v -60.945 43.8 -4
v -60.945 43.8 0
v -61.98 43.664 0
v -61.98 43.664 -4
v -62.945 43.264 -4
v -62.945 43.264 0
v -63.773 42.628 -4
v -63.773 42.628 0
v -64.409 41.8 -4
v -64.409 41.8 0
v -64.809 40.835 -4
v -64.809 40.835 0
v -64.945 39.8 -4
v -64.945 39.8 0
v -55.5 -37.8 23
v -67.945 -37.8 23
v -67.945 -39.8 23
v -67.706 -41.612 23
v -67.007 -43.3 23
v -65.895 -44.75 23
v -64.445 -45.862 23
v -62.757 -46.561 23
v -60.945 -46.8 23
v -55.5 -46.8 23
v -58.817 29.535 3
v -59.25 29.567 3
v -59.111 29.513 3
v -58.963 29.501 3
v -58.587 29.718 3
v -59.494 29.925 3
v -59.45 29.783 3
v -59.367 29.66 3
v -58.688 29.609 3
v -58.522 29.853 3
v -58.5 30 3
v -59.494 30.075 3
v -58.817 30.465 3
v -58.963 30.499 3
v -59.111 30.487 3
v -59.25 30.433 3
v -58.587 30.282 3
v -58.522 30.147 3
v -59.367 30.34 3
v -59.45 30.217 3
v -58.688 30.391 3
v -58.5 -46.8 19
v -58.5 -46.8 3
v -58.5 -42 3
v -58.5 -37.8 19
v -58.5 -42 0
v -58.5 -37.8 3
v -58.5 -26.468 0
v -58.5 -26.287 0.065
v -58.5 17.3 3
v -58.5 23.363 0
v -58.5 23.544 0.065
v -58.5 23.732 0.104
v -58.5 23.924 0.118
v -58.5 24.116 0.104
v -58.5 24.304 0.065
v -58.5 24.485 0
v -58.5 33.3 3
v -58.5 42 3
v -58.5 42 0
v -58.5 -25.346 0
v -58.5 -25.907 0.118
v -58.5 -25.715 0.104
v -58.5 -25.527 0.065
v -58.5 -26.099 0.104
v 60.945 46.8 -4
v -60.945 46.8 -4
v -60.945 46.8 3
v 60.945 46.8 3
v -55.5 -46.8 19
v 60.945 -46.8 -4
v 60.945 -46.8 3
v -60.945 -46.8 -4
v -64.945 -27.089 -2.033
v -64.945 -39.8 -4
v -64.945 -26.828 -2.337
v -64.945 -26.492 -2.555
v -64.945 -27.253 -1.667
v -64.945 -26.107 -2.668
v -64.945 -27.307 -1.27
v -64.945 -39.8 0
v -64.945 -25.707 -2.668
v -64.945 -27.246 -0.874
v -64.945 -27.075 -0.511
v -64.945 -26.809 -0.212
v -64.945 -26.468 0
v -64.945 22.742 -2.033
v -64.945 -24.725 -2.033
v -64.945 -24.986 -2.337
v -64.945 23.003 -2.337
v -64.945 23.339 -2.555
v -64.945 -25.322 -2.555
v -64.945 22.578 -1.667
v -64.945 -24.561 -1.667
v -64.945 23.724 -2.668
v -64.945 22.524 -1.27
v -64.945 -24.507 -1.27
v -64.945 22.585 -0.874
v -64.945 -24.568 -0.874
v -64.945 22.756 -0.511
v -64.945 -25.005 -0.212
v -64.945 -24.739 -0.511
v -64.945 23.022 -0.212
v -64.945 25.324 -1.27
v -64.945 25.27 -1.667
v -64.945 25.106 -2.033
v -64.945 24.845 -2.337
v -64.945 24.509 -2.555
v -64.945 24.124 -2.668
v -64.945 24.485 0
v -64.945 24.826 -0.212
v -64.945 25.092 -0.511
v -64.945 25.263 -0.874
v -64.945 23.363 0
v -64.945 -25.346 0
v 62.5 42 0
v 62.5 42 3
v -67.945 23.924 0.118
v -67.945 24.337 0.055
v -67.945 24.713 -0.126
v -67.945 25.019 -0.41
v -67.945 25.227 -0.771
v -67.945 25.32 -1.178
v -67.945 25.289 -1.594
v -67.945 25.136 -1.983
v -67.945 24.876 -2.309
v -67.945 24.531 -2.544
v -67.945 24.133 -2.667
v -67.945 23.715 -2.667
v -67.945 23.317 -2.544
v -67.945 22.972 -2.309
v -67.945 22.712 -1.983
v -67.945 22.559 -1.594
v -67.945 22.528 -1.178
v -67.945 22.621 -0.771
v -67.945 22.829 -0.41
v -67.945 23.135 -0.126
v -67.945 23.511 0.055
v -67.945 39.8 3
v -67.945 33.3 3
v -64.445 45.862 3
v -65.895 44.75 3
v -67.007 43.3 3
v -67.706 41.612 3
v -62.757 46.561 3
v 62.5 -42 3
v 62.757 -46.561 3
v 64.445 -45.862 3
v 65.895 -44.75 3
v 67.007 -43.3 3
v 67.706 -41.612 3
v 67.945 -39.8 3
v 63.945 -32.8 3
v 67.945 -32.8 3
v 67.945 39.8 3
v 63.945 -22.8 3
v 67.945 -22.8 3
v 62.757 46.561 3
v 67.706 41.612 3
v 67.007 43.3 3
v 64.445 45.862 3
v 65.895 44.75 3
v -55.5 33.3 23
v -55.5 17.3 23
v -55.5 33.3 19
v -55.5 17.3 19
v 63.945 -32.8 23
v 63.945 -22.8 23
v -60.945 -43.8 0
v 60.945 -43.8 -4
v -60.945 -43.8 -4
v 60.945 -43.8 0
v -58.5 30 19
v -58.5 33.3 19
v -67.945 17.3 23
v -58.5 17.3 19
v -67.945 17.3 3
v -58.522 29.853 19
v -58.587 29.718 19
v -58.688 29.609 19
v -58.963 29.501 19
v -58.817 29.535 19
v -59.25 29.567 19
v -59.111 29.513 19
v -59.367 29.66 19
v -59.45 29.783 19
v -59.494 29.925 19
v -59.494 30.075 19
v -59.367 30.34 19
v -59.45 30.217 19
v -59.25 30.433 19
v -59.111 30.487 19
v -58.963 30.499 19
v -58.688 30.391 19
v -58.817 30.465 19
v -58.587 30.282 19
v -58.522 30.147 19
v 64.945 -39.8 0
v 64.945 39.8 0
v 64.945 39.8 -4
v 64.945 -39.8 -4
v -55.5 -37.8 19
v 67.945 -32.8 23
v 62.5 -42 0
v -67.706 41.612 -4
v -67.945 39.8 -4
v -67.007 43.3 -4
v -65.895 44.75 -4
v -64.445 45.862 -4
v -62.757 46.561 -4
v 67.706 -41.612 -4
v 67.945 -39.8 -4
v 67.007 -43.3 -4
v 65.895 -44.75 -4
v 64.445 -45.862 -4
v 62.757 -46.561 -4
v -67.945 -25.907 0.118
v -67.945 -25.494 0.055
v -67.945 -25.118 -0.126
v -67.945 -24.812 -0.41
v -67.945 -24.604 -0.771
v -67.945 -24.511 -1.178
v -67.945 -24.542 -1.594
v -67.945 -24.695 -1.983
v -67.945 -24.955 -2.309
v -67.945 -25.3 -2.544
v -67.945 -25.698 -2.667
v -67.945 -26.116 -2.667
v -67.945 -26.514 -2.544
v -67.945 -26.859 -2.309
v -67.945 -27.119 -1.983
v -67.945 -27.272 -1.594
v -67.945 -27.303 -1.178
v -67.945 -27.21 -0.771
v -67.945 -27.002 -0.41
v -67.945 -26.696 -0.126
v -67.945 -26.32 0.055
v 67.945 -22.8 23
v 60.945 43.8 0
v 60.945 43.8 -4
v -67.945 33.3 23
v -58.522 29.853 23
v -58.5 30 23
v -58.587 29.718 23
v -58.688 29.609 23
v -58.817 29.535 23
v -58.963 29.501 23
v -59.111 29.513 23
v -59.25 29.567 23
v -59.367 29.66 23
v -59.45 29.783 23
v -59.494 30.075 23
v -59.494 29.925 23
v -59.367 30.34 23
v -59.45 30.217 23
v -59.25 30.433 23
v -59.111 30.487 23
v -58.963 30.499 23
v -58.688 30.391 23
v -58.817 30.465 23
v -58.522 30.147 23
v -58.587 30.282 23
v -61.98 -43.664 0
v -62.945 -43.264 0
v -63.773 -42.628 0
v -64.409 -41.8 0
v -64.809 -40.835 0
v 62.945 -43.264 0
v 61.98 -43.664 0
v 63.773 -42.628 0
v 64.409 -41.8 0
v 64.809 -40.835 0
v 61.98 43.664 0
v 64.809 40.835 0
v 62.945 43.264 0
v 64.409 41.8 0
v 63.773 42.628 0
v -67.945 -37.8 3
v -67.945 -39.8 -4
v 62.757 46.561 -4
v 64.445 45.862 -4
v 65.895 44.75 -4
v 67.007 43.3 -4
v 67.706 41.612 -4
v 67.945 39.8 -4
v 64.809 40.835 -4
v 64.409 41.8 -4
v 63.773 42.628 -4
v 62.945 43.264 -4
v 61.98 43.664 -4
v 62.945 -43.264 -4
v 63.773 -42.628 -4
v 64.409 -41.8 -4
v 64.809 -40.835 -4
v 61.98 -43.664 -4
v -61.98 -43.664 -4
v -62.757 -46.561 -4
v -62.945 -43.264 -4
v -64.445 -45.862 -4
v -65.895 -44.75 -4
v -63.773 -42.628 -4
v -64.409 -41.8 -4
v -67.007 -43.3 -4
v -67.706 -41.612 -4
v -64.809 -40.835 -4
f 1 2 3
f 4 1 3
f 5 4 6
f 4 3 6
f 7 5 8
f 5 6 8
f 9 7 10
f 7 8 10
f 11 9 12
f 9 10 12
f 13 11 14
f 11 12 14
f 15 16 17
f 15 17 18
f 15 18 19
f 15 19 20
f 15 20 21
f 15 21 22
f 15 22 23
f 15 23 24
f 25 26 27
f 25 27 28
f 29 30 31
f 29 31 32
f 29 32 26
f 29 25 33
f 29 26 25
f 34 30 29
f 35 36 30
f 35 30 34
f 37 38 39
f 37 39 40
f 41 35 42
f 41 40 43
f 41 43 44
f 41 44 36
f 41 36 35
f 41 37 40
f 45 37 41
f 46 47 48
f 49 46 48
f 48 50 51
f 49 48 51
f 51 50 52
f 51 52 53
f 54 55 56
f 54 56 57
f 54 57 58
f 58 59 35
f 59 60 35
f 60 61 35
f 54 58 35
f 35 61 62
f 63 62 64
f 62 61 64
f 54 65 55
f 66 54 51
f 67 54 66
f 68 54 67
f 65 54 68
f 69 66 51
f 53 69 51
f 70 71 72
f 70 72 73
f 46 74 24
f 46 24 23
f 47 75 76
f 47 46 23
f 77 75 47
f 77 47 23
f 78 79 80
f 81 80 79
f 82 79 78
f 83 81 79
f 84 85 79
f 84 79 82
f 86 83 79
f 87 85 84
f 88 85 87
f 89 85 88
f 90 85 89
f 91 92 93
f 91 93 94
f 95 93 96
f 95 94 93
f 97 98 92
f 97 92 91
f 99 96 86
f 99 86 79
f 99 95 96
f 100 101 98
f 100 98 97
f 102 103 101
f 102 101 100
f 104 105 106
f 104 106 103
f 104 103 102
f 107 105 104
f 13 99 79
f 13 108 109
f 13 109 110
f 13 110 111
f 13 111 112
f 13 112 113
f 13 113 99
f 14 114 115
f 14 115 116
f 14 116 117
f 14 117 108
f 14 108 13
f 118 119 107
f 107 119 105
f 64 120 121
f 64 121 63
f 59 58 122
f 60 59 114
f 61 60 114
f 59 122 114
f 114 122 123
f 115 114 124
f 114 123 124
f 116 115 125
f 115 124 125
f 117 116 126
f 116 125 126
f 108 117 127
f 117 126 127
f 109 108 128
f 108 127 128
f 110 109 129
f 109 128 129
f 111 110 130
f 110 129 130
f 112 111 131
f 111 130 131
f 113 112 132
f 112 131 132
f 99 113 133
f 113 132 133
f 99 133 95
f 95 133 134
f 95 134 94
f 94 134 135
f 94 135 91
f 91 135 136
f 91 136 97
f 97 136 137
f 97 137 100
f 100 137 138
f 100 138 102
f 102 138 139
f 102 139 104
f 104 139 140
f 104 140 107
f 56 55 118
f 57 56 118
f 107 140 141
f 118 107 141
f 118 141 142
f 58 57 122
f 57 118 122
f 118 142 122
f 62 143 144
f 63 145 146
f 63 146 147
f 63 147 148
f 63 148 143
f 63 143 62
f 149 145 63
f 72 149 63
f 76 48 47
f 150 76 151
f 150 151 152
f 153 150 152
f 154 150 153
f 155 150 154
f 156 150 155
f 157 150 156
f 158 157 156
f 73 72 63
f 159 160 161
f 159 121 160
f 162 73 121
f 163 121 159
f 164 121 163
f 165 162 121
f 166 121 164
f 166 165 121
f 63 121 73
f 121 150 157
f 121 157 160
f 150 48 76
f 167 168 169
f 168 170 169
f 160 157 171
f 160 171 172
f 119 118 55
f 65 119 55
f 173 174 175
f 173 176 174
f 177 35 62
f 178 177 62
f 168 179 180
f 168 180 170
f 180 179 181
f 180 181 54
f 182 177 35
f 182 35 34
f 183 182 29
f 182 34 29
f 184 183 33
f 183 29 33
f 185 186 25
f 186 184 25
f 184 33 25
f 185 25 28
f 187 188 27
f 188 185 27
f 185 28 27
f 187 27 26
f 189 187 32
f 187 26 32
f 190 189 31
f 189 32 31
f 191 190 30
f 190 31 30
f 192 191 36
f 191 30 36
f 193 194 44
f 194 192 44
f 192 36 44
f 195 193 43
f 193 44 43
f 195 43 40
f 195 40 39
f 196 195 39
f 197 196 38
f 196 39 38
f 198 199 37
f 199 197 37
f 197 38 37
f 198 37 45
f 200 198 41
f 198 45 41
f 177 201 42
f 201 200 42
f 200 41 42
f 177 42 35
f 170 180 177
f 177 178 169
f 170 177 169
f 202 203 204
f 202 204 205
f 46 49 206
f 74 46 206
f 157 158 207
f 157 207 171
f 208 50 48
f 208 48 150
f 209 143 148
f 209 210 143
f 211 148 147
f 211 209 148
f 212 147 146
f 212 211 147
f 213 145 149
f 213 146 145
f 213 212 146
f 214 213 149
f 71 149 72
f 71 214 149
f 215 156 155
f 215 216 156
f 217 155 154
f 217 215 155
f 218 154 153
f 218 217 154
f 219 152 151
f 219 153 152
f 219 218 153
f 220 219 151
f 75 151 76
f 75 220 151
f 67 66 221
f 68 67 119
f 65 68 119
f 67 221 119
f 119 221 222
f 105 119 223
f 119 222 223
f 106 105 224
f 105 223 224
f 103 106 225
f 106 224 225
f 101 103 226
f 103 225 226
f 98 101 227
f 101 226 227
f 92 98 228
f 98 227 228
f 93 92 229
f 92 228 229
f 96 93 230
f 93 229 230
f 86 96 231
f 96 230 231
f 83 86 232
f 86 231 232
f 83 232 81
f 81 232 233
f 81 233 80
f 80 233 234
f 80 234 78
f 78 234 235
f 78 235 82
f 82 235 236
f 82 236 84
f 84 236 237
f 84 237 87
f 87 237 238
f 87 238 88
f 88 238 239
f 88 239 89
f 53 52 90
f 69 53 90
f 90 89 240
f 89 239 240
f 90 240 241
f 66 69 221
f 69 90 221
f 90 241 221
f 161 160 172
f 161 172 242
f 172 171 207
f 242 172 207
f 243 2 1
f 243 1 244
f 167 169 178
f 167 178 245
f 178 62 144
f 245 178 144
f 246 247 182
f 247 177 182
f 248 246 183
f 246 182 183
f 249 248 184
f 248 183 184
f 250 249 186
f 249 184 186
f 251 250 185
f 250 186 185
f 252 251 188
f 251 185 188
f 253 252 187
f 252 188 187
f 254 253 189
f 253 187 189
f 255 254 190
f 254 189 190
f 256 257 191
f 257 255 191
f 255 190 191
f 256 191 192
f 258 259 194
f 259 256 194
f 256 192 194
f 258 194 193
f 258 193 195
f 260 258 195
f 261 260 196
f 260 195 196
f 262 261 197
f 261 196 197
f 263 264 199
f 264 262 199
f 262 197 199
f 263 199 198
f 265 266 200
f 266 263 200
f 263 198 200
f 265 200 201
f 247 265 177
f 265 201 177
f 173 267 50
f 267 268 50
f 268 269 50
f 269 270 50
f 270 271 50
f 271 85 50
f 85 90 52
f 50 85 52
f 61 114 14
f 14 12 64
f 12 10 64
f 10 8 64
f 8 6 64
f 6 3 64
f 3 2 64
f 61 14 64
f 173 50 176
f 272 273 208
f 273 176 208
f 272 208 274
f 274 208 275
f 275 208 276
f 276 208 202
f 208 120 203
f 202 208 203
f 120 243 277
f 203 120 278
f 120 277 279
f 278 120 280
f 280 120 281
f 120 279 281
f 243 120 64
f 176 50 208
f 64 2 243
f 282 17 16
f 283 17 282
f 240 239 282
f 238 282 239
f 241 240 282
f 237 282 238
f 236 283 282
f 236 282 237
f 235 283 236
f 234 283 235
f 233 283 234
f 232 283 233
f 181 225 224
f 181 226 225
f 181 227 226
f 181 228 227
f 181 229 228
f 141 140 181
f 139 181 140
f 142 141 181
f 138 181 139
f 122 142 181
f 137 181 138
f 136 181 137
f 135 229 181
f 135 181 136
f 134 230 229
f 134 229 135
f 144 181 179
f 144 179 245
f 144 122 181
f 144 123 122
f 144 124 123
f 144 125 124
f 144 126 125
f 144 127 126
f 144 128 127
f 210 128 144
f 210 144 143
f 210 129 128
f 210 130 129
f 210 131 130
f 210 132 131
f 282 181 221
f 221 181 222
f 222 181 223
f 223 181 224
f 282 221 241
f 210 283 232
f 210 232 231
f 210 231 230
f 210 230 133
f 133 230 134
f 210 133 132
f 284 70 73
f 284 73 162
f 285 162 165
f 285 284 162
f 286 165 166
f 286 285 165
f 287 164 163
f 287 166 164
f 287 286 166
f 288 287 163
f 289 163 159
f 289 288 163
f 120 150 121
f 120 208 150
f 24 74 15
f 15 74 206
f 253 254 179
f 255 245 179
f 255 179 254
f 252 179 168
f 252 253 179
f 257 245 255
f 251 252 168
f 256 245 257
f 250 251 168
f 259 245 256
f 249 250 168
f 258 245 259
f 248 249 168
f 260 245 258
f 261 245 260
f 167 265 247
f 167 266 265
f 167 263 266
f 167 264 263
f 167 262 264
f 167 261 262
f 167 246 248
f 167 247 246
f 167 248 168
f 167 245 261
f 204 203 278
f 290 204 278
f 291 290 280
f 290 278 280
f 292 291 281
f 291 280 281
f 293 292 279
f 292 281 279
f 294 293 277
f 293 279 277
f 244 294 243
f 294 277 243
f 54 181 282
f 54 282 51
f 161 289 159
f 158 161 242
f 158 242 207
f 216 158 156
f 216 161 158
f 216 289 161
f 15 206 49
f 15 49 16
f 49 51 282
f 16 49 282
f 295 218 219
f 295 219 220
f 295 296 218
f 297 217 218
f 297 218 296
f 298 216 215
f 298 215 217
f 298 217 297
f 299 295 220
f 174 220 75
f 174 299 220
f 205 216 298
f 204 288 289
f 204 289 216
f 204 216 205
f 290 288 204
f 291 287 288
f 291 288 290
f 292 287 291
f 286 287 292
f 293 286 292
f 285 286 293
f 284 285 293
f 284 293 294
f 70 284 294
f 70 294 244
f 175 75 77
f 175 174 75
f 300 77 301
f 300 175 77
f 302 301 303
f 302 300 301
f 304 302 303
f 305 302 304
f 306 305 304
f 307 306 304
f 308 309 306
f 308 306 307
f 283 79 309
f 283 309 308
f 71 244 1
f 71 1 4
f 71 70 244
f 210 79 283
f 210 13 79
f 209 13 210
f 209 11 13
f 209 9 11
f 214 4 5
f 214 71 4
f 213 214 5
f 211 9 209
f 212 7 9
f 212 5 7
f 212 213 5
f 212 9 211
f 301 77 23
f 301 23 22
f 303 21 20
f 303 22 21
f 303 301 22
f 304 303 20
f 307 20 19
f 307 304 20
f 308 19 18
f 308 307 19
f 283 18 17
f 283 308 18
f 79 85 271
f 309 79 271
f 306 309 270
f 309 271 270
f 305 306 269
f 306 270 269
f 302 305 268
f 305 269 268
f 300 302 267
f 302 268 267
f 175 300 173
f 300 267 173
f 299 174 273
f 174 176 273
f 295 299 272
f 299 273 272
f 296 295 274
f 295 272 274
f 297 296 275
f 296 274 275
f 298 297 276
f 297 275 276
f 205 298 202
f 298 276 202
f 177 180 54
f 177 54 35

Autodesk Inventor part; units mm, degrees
ref_plane "YZ Plane" through (0, 0, 0) normal (1, 0, 0) x (0, 1, 0)
ref_plane "XZ Plane" through (0, 0, 0) normal (0, 1, 0) x (-1, 0, 0)
ref_plane "XY Plane" through (0, 0, 0) normal (0, 0, 1) x (1, 0, 0)
ref_plane "Work Plane1" through (-7.109, -3.9363, 0) normal (0, 0, 1) x (1, 0, 0)
sketch "Sketch1" plane through (-7.109, -3.9363, 0) normal (0, 0, 1) x (1, 0, 0)
  line L0 (71.054, 43.7363) -> (71.054, -35.8637) construction
  arc A0 (71.054, 43.7363) -> (68.054, 46.7363) centre (68.054, 43.7363) ccw construction
  line L1 (-53.836, 46.7363) -> (68.054, 46.7363) construction
  arc A1 (-53.836, 46.7363) -> (-56.836, 43.7363) centre (-53.836, 43.7363) ccw construction
  line L2 (-56.836, -35.8637) -> (-56.836, 43.7363) construction
  arc A2 (-56.836, -35.8637) -> (-53.836, -38.8637) centre (-53.836, -35.8637) ccw construction
  line L3 (68.054, -38.8637) -> (-53.836, -38.8637) construction
  arc A3 (68.054, -38.8637) -> (71.054, -35.8637) centre (68.054, -35.8637) ccw construction
  line L4 (-56.516, -35.5437) -> (-56.516, 43.4163) construction
  arc A4 (-53.516, 46.4163) -> (-56.516, 43.4163) centre (-53.516, 43.4163) ccw construction
  line L5 (-53.516, 46.4163) -> (67.734, 46.4163) construction
  arc A5 (70.734, 43.4163) -> (67.734, 46.4163) centre (67.734, 43.4163) ccw construction
  line L6 (70.734, 43.4163) -> (70.734, -35.5437) construction
  arc A6 (67.734, -38.5437) -> (70.734, -35.5437) centre (67.734, -35.5437) ccw construction
  line L7 (67.734, -38.5437) -> (-53.516, -38.5437) construction
  arc A7 (-56.516, -35.5437) -> (-53.516, -38.5437) centre (-53.516, -35.5437) ccw construction
  arc A8 (75.054, 43.7363) -> (68.054, 50.7363) centre (68.054, 43.7363) ccw
  line L8 (75.054, 43.7363) -> (75.054, -35.8637)
  arc A9 (68.054, -42.8637) -> (75.054, -35.8637) centre (68.054, -35.8637) ccw
  line L9 (68.054, -42.8637) -> (-53.836, -42.8637)
  arc A10 (-60.836, -35.8637) -> (-53.836, -42.8637) centre (-53.836, -35.8637) ccw
  line L10 (-60.836, -35.8637) -> (-60.836, 43.7363)
  arc A11 (-53.836, 50.7363) -> (-60.836, 43.7363) centre (-53.836, 43.7363) ccw
  line L11 (-53.836, 50.7363) -> (68.054, 50.7363)
  circle A12 centre (53.6173, 21.8363) radius 4 construction
  circle A13 centre (53.6173, 3.8363) radius 4 construction
  circle A14 centre (53.6173, -14.1637) radius 4 construction
  circle A15 centre (35.6173, 21.8363) radius 4 construction
  circle A16 centre (35.6173, 3.8363) radius 4 construction
  circle A17 centre (35.6173, -14.1637) radius 4 construction
  circle A18 centre (17.6173, 21.8363) radius 4 construction
  circle A19 centre (17.6173, 3.8363) radius 4 construction
  circle A20 centre (17.6173, -14.1637) radius 4 construction
  circle A21 centre (-0.3827, 21.8363) radius 4 construction
  circle A22 centre (-0.3827, 3.8363) radius 4 construction
  circle A23 centre (-0.3827, -14.1637) radius 4 construction
  circle A24 centre (-18.3827, 21.8363) radius 4 construction
  circle A25 centre (-18.3827, 3.8363) radius 4 construction
  circle A26 centre (-18.3827, -14.1637) radius 4 construction
  circle A27 centre (-36.3827, 21.8363) radius 4 construction
  circle A28 centre (-36.3827, 3.8363) radius 4 construction
  circle A29 centre (-36.3827, -14.1637) radius 4 construction
  circle A30 centre (-36.3827, 30.7863) radius 4.375 construction
  circle A31 centre (-18.3827, 30.7863) radius 4.375 construction
  circle A32 centre (-0.3827, 30.7863) radius 4.375 construction
  circle A33 centre (17.6173, 30.7863) radius 4.375 construction
  circle A34 centre (35.6173, 30.7863) radius 4.375 construction
  circle A35 centre (53.6173, 30.7863) radius 4.375 construction
  circle A36 centre (-36.3827, 12.7863) radius 4.375 construction
  circle A37 centre (-18.3827, 12.7863) radius 4.375 construction
  circle A38 centre (-0.3827, 12.7863) radius 4.375 construction
  circle A39 centre (17.6173, 12.7863) radius 4.375 construction
  circle A40 centre (35.6173, 12.7863) radius 4.375 construction
  circle A41 centre (53.6173, 12.7863) radius 4.375 construction
  circle A42 centre (-36.3827, -5.2137) radius 4.375 construction
  circle A43 centre (-18.3827, -5.2137) radius 4.375 construction
  circle A44 centre (-0.3827, -5.2137) radius 4.375 construction
  circle A45 centre (17.6173, -5.2137) radius 4.375 construction
  circle A46 centre (35.6173, -5.2137) radius 4.375 construction
  circle A47 centre (53.6173, -5.2137) radius 4.375 construction
  circle A48 centre (-36.3827, -23.2137) radius 4.375 construction
  circle A49 centre (-18.3827, -23.2137) radius 4.375 construction
  circle A50 centre (-0.3827, -23.2137) radius 4.375 construction
  circle A51 centre (17.6173, -23.2137) radius 4.375 construction
  circle A52 centre (35.6173, -23.2137) radius 4.375 construction
  circle A53 centre (53.6173, -23.2137) radius 4.375 construction
  arc A54 (57.7361, 42.9363) -> (61.1439, 37.9635) centre (61.609, 41.9363) ccw construction
  line L12 (-39.518, 42.9363) -> (57.7361, 42.9363) construction
  arc A55 (-42.9259, 37.9635) -> (-39.518, 42.9363) centre (-43.391, 41.9363) ccw construction
  arc A56 (-48.391, 33.7282) -> (-42.9259, 37.9635) centre (-46.891, 37.4363) ccw construction
  line L13 (-48.391, -25.8556) -> (-48.391, 33.7282) construction
  arc A57 (-42.9259, -30.0908) -> (-48.391, -25.8556) centre (-46.891, -29.5637) ccw construction
  arc A58 (-39.518, -35.0637) -> (-42.9259, -30.0908) centre (-43.391, -34.0637) ccw construction
  line L14 (57.7361, -35.0637) -> (-39.518, -35.0637) construction
  arc A59 (61.1439, -30.0908) -> (57.7361, -35.0637) centre (61.609, -34.0637) ccw construction
  arc A60 (66.609, -25.8556) -> (61.1439, -30.0908) centre (65.109, -29.5637) ccw construction
  line L15 (66.609, 33.7282) -> (66.609, -25.8556) construction
  arc A61 (61.1439, 37.9635) -> (66.609, 33.7282) centre (65.109, 37.4363) ccw construction
  arc A62 (67.609, -27.9054) -> (62.6207, -31.2394) centre (65.109, -29.5637) ccw construction
  arc A63 (62.6207, -31.2394) -> (59.373, -36.0637) centre (61.609, -34.0637) ccw construction
  line L16 (59.373, -36.0637) -> (-41.1549, -36.0637) construction
  arc A64 (-41.1549, -36.0637) -> (-44.4026, -31.2394) centre (-43.391, -34.0637) ccw construction
  arc A65 (-44.4026, -31.2394) -> (-49.391, -27.9054) centre (-46.891, -29.5637) ccw construction
  line L17 (-49.391, -27.9054) -> (-49.391, 35.778) construction
  arc A66 (-49.391, 35.778) -> (-44.4026, 39.112) centre (-46.891, 37.4363) ccw construction
  arc A67 (-44.4026, 39.112) -> (-41.1549, 43.9363) centre (-43.391, 41.9363) ccw construction
  line L18 (-41.1549, 43.9363) -> (59.373, 43.9363) construction
  arc A68 (59.373, 43.9363) -> (62.6207, 39.112) centre (61.609, 41.9363) ccw construction
  arc A69 (62.6207, 39.112) -> (67.609, 35.778) centre (65.109, 37.4363) ccw construction
  line L19 (67.609, 35.778) -> (67.609, -27.9054) construction
  line L20 (69.609, 45.9363) -> (-51.391, 45.9363)
  line L21 (-51.391, 45.9363) -> (-51.391, -38.0637)
  line L22 (-51.391, -38.0637) -> (69.609, -38.0637)
  line L23 (69.609, -38.0637) -> (69.609, 45.9363)
  point P0 (7.109, 3.9363)
  dimension "d0" = 4
  dimension "d1" = 1
  dimension "d10" = 2
  dimension "d11" = 2
  dimension "d12" = 2
  dimension "d13" = 2
extrude "Extrusion1" add sketch "Sketch1" along normal blind 3
sketch "Sketch2" plane through (-7.109, -3.9363, 0) normal (0, 0, -1) x (-1, 0, 0)
  line L0 (-71.054, 43.7363) -> (-71.054, -35.8637) construction
  arc A0 (-68.054, 46.7363) -> (-71.054, 43.7363) centre (-68.054, 43.7363) ccw construction
  line L1 (53.836, 46.7363) -> (-68.054, 46.7363) construction
  arc A1 (56.836, 43.7363) -> (53.836, 46.7363) centre (53.836, 43.7363) ccw construction
  line L2 (56.836, -35.8637) -> (56.836, 43.7363) construction
  arc A2 (53.836, -38.8637) -> (56.836, -35.8637) centre (53.836, -35.8637) ccw construction
  line L3 (-68.054, -38.8637) -> (53.836, -38.8637) construction
  arc A3 (-71.054, -35.8637) -> (-68.054, -38.8637) centre (-68.054, -35.8637) ccw construction
  line L4 (56.516, -35.5437) -> (56.516, 43.4163) construction
  arc A4 (56.516, 43.4163) -> (53.516, 46.4163) centre (53.516, 43.4163) ccw construction
  line L5 (53.516, 46.4163) -> (-67.734, 46.4163) construction
  arc A5 (-67.734, 46.4163) -> (-70.734, 43.4163) centre (-67.734, 43.4163) ccw construction
  line L6 (-70.734, 43.4163) -> (-70.734, -35.5437) construction
  arc A6 (-70.734, -35.5437) -> (-67.734, -38.5437) centre (-67.734, -35.5437) ccw construction
  line L7 (-67.734, -38.5437) -> (53.516, -38.5437) construction
  arc A7 (53.516, -38.5437) -> (56.516, -35.5437) centre (53.516, -35.5437) ccw construction
  arc A8 (-68.054, 47.7363) -> (-72.054, 43.7363) centre (-68.054, 43.7363) ccw
  line L8 (-72.054, 43.7363) -> (-72.054, -35.8637)
  arc A9 (-72.054, -35.8637) -> (-68.054, -39.8637) centre (-68.054, -35.8637) ccw
  line L9 (-68.054, -39.8637) -> (53.836, -39.8637)
  arc A10 (53.836, -39.8637) -> (57.836, -35.8637) centre (53.836, -35.8637) ccw
  line L10 (57.836, -35.8637) -> (57.836, 43.7363)
  arc A11 (57.836, 43.7363) -> (53.836, 47.7363) centre (53.836, 43.7363) ccw
  line L11 (53.836, 47.7363) -> (-68.054, 47.7363)
  arc A12 (56.016, 43.4163) -> (53.516, 45.9163) centre (53.516, 43.4163) ccw
  line L12 (56.016, 43.4163) -> (56.016, -35.5437)
  arc A13 (53.516, -38.0437) -> (56.016, -35.5437) centre (53.516, -35.5437) ccw
  line L13 (53.516, -38.0437) -> (-67.734, -38.0437)
  arc A14 (-70.234, -35.5437) -> (-67.734, -38.0437) centre (-67.734, -35.5437) ccw
  line L14 (-70.234, -35.5437) -> (-70.234, 43.4163)
  arc A15 (-67.734, 45.9163) -> (-70.234, 43.4163) centre (-67.734, 43.4163) ccw
  line L15 (-67.734, 45.9163) -> (53.516, 45.9163)
  line L16 (-69.609, 45.9363) -> (-69.609, -38.0637) projected
  line L17 (-69.609, -38.0637) -> (51.391, -38.0637) projected
  line L18 (51.391, -38.0637) -> (51.391, 45.9363) projected
  line L19 (51.391, 45.9363) -> (-69.609, 45.9363) projected
  arc A16 (-68.054, 50.7363) -> (-75.054, 43.7363) centre (-68.054, 43.7363) ccw projected
  line L20 (-68.054, 50.7363) -> (53.836, 50.7363) projected
  arc A17 (60.836, 43.7363) -> (53.836, 50.7363) centre (53.836, 43.7363) ccw projected
  line L21 (60.836, 43.7363) -> (60.836, -35.8637) projected
  arc A18 (53.836, -42.8637) -> (60.836, -35.8637) centre (53.836, -35.8637) ccw projected
  line L22 (53.836, -42.8637) -> (-68.054, -42.8637) projected
  arc A19 (-75.054, -35.8637) -> (-68.054, -42.8637) centre (-68.054, -35.8637) ccw projected
  line L23 (-75.054, -35.8637) -> (-75.054, 43.7363) projected
  point P0 (-7.109, 3.9363)
  dimension "d4" = 1
  dimension "d5" = 0.5
extrude "Extrusion2" add sketch "Sketch2" along normal blind 4 contours L20 A17 L21 A18 L22 A19 L23 A16
sketch "Sketch3" plane through (-7.109, -3.9363, 3) normal (0, 0, 1) x (1, 0, 0)
  line L0 (69.609, 45.9363) -> (69.609, -38.0637) projected
  line L1 (69.609, -38.0637) -> (-51.391, -38.0637) projected
  line L2 (-51.391, -38.0637) -> (-51.391, 45.9363) projected
  line L3 (-51.391, 45.9363) -> (69.609, 45.9363) projected
  arc A0 (75.054, 43.7363) -> (68.054, 50.7363) centre (68.054, 43.7363) ccw projected
  line L4 (68.054, 50.7363) -> (-53.836, 50.7363) projected
  arc A1 (-53.836, 50.7363) -> (-60.836, 43.7363) centre (-53.836, 43.7363) ccw projected
  line L5 (-60.836, 43.7363) -> (-60.836, -35.8637) projected
  arc A2 (-60.836, -35.8637) -> (-53.836, -42.8637) centre (-53.836, -35.8637) ccw projected
  line L6 (-53.836, -42.8637) -> (68.054, -42.8637) projected
  arc A3 (68.054, -42.8637) -> (75.054, -35.8637) centre (68.054, -35.8637) ccw projected
  line L7 (75.054, -35.8637) -> (75.054, 43.7363) projected
  line L8 (75.054, 25.8105) -> (71.9538, 25.8105)
  line L9 (70.434, 43.4163) -> (70.434, -35.5437) projected
  arc A4 (75.054, 43.7363) -> (68.054, 50.7363) centre (68.054, 43.7363) ccw projected
  line L10 (75.054, -28.8637) -> (71.054, -28.8637)
  line L11 (71.054, -28.8637) -> (71.054, -18.8637)
  line L12 (71.054, -18.8637) -> (75.054, -18.8637)
  line L13 (75.054, -18.8637) -> (75.054, -28.8637)
  circle A5 centre (70.109, -26.0637) radius 0.5 projected
  line L14 (67.609, -23.0637) -> (67.609, -29.0637) projected
  line L15 (67.609, -29.0637) -> (72.609, -29.0637) projected
  line L16 (72.609, -23.0637) -> (72.609, -29.0637) projected
  line L17 (67.609, -23.0637) -> (72.609, -23.0637) projected
  point P0 (7.109, 3.9363)
  point P1 (71.7253, 49.6963)
  dimension "d14" = 4
  dimension "d15" = 10
  dimension "d23" = 14
extrude "Extrusion3" add sketch "Sketch3" along normal blind 20 contours L17 L16 L10 L11 | L11 L12 L7 L10 L16 L17
ref_plane "Work Plane2" through (0, -39.8, -4) normal (1, 0, 0) x (0, 0, -1)
sketch "Sketch4" plane through (-7.109, -3.9363, 3) normal (0, 0, 1) x (1, 0, 0)
  arc A0 (75.054, 43.7363) -> (68.054, 50.7363) centre (68.054, 43.7363) ccw projected
  line L0 (68.054, 50.7363) -> (-53.836, 50.7363) projected
  arc A1 (-53.836, 50.7363) -> (-60.836, 43.7363) centre (-53.836, 43.7363) ccw projected
  line L1 (-60.836, 43.7363) -> (-60.836, -35.8637) projected
  arc A2 (-60.836, -35.8637) -> (-53.836, -42.8637) centre (-53.836, -35.8637) ccw projected
  line L2 (-53.836, -42.8637) -> (68.054, -42.8637) projected
  arc A3 (68.054, -42.8637) -> (75.054, -35.8637) centre (68.054, -35.8637) ccw projected
  line L3 (75.054, -18.8637) -> (75.054, 43.7363) projected
  line L4 (71.054, -28.8637) -> (71.054, -18.8637) projected
  line L5 (69.609, 45.9363) -> (69.609, -38.0637) projected
  line L6 (69.609, -38.0637) -> (-51.391, -38.0637) projected
  line L7 (-51.391, -38.0637) -> (-51.391, 45.9363) projected
  line L8 (-51.391, 45.9363) -> (69.609, 45.9363) projected
  circle A4 centre (-51.891, 33.9363) radius 0.5 projected
  line L9 (-49.391, 30.9363) -> (-49.391, 36.9363) projected
  line L10 (-49.391, 36.9363) -> (-54.391, 36.9363) projected
  line L11 (-54.391, 30.9363) -> (-54.391, 36.9363) projected
  line L12 (-49.391, 30.9363) -> (-54.391, 30.9363) projected
  line L13 (-51.391, -38.0637) -> (-51.391, 45.9363) projected
  line L14 (-60.836, -35.8637) -> (-60.836, 43.7363) construction
  line L15 (-51.391, 37.2363) -> (-60.836, 37.2363)
  line L16 (-60.836, 37.2363) -> (-60.836, 21.2363)
  line L17 (-60.836, 21.2363) -> (-51.391, 21.2363)
  line L18 (-51.391, 21.2363) -> (-51.391, 37.2363)
  line L19 (71.054, -18.8637) -> (75.054, -18.8637) projected
  line L20 (75.054, -35.8637) -> (75.054, -28.8637) projected
  line L21 (75.054, -28.8637) -> (71.054, -28.8637) projected
  line L22 (-53.836, -42.8637) -> (68.054, -42.8637) projected
  line L23 (-51.391, -42.8637) -> (-51.391, -38.0637)
  line L24 (-51.391, 45.9363) -> (-51.391, -38.0637) projected
  line L25 (-51.391, -33.8637) -> (-60.836, -33.8637)
  line L26 (-51.391, -33.8637) -> (-60.836, -33.8637)
  line L27 (-60.836, -33.8637) -> (-60.836, -42.8637)
  line L28 (-60.836, -42.8637) -> (-51.391, -42.8637)
  line L29 (-51.391, -42.8637) -> (-51.391, -33.8637)
  line L30 (-60.836, 43.7363) -> (-60.836, -35.8637) projected
  arc A5 (-60.836, -35.8637) -> (-53.836, -42.8637) centre (-53.836, -35.8637) ccw projected
  arc A6 (-60.836, -35.8637) -> (-53.836, -42.8637) centre (-53.836, -35.8637) ccw
  point P0 (7.109, 3.9363)
  dimension "d20" = 16
  dimension "d28" = 13.5
  dimension "d30" = 9
extrude "Extrusion4" add sketch "Sketch4" along normal blind 16 contours L15 L7 L10 L11 L12 L17 L1 | L25 L7 L23 L2 A2 L1 | L7 L12 L11 L10
sketch "Sketch5" plane through (-67.945, -39.8, -4) normal (-1, 0, 0) x (0, 0, 1)
  line L0 (23, 0) -> (0, 0) projected
  line L1 (7, 57.1) -> (7, 2) projected
  line L2 (7, 57.1) -> (23, 57.1) projected
  line L3 (23, 73.1) -> (23, 57.1) projected
  line L4 (7, 73.1) -> (23, 73.1) projected
  line L5 (7, 79.6) -> (7, 73.1) projected
  line L6 (7, 79.6) -> (0, 79.6) projected
  line L7 (0, 0) -> (0, 79.6) projected
  circle A0 centre (2.7175, 63.724) radius 1.4
  circle A1 centre (2.7175, 13.893) radius 1.4
  line L8 (23, 0) -> (0, 0) projected
  line L9 (7, 0) -> (23, 0)
  line L10 (23, 0) -> (23, 2)
  line L11 (23, 2) -> (7, 2)
  line L12 (7, 2) -> (7, 0)
  line L13 (23, -7) -> (0, -7) projected
  line L14 (7, -7) -> (7, 0) projected
  line L15 (7, 0) -> (23, 0)
  line L16 (23, 0) -> (23, -7)
  line L17 (23, -7) -> (7, -7)
  line L18 (7, -7) -> (7, 0)
  line L19 (0, 0) -> (0, 79.6) projected
  line L20 (7, -7) -> (0, -7)
  line L21 (0, -7) -> (0, 2)
  line L22 (0, 2) -> (7, 2)
  line L23 (7, 2) -> (7, -7)
  line L24 (23, 2) -> (23, 0) projected
  line L25 (7, 2) -> (23, 2) projected
  point P0 (4, 39.8)
  dimension "d24" = 2.8
  dimension "d25" = 2.8
  dimension "d29" = 9
extrude "Extrusion5" cut sketch "Sketch5" against normal blind 16 contours A0 | A1
sketch "Sketch6" plane through (-7.109, -3.9363, 19) normal (0, 0, 1) x (1, 0, 0)
  arc A0 (-60.836, -35.8637) -> (-53.836, -42.8637) centre (-53.836, -35.8637) ccw projected
  line L0 (-53.836, -42.8637) -> (-51.391, -42.8637) projected
  line L1 (-51.391, -42.8637) -> (-51.391, -33.8637) projected
  line L2 (-51.391, -33.8637) -> (-60.836, -33.8637) projected
  line L3 (-60.836, -33.8637) -> (-60.836, -35.8637) projected
  line L4 (-60.836, 21.2363) -> (-51.391, 21.2363) projected
  line L5 (-51.391, 21.2363) -> (-51.391, 33.9363) projected
  circle A1 centre (-51.891, 33.9363) radius 0.5 projected
  line L6 (-51.391, 33.9363) -> (-51.391, 37.2363) projected
  line L7 (-51.391, 37.2363) -> (-60.836, 37.2363) projected
  line L8 (-60.836, 37.2363) -> (-60.836, 21.2363) projected
  line L9 (-51.391, -42.8637) -> (-48.391, -42.8637)
  line L10 (-48.391, -42.8637) -> (-48.391, -33.8637)
  line L11 (-48.391, -33.8637) -> (-51.391, -33.8637)
  line L12 (-51.391, -33.8637) -> (-51.391, -42.8637)
  line L13 (-60.836, 21.2363) -> (-51.391, 21.2363) projected
  line L14 (-51.391, 21.2363) -> (-48.391, 21.2363)
  line L15 (-48.391, 21.2363) -> (-48.391, 37.2363)
  line L16 (-48.391, 37.2363) -> (-51.391, 37.2363)
  line L17 (-51.391, 37.2363) -> (-51.391, 21.2363)
  point P0 (7.109, 3.9363)
  dimension "d31" = 3
extrude "Extrusion6" add sketch "Sketch6" along normal up to surface (4 mm away)
equation "\"d10\" = d11"
equation "\"d12\" = d11"
equation "\"d13\" = d11"
properties part number "07_Omnivision_wellplate_traystage"
